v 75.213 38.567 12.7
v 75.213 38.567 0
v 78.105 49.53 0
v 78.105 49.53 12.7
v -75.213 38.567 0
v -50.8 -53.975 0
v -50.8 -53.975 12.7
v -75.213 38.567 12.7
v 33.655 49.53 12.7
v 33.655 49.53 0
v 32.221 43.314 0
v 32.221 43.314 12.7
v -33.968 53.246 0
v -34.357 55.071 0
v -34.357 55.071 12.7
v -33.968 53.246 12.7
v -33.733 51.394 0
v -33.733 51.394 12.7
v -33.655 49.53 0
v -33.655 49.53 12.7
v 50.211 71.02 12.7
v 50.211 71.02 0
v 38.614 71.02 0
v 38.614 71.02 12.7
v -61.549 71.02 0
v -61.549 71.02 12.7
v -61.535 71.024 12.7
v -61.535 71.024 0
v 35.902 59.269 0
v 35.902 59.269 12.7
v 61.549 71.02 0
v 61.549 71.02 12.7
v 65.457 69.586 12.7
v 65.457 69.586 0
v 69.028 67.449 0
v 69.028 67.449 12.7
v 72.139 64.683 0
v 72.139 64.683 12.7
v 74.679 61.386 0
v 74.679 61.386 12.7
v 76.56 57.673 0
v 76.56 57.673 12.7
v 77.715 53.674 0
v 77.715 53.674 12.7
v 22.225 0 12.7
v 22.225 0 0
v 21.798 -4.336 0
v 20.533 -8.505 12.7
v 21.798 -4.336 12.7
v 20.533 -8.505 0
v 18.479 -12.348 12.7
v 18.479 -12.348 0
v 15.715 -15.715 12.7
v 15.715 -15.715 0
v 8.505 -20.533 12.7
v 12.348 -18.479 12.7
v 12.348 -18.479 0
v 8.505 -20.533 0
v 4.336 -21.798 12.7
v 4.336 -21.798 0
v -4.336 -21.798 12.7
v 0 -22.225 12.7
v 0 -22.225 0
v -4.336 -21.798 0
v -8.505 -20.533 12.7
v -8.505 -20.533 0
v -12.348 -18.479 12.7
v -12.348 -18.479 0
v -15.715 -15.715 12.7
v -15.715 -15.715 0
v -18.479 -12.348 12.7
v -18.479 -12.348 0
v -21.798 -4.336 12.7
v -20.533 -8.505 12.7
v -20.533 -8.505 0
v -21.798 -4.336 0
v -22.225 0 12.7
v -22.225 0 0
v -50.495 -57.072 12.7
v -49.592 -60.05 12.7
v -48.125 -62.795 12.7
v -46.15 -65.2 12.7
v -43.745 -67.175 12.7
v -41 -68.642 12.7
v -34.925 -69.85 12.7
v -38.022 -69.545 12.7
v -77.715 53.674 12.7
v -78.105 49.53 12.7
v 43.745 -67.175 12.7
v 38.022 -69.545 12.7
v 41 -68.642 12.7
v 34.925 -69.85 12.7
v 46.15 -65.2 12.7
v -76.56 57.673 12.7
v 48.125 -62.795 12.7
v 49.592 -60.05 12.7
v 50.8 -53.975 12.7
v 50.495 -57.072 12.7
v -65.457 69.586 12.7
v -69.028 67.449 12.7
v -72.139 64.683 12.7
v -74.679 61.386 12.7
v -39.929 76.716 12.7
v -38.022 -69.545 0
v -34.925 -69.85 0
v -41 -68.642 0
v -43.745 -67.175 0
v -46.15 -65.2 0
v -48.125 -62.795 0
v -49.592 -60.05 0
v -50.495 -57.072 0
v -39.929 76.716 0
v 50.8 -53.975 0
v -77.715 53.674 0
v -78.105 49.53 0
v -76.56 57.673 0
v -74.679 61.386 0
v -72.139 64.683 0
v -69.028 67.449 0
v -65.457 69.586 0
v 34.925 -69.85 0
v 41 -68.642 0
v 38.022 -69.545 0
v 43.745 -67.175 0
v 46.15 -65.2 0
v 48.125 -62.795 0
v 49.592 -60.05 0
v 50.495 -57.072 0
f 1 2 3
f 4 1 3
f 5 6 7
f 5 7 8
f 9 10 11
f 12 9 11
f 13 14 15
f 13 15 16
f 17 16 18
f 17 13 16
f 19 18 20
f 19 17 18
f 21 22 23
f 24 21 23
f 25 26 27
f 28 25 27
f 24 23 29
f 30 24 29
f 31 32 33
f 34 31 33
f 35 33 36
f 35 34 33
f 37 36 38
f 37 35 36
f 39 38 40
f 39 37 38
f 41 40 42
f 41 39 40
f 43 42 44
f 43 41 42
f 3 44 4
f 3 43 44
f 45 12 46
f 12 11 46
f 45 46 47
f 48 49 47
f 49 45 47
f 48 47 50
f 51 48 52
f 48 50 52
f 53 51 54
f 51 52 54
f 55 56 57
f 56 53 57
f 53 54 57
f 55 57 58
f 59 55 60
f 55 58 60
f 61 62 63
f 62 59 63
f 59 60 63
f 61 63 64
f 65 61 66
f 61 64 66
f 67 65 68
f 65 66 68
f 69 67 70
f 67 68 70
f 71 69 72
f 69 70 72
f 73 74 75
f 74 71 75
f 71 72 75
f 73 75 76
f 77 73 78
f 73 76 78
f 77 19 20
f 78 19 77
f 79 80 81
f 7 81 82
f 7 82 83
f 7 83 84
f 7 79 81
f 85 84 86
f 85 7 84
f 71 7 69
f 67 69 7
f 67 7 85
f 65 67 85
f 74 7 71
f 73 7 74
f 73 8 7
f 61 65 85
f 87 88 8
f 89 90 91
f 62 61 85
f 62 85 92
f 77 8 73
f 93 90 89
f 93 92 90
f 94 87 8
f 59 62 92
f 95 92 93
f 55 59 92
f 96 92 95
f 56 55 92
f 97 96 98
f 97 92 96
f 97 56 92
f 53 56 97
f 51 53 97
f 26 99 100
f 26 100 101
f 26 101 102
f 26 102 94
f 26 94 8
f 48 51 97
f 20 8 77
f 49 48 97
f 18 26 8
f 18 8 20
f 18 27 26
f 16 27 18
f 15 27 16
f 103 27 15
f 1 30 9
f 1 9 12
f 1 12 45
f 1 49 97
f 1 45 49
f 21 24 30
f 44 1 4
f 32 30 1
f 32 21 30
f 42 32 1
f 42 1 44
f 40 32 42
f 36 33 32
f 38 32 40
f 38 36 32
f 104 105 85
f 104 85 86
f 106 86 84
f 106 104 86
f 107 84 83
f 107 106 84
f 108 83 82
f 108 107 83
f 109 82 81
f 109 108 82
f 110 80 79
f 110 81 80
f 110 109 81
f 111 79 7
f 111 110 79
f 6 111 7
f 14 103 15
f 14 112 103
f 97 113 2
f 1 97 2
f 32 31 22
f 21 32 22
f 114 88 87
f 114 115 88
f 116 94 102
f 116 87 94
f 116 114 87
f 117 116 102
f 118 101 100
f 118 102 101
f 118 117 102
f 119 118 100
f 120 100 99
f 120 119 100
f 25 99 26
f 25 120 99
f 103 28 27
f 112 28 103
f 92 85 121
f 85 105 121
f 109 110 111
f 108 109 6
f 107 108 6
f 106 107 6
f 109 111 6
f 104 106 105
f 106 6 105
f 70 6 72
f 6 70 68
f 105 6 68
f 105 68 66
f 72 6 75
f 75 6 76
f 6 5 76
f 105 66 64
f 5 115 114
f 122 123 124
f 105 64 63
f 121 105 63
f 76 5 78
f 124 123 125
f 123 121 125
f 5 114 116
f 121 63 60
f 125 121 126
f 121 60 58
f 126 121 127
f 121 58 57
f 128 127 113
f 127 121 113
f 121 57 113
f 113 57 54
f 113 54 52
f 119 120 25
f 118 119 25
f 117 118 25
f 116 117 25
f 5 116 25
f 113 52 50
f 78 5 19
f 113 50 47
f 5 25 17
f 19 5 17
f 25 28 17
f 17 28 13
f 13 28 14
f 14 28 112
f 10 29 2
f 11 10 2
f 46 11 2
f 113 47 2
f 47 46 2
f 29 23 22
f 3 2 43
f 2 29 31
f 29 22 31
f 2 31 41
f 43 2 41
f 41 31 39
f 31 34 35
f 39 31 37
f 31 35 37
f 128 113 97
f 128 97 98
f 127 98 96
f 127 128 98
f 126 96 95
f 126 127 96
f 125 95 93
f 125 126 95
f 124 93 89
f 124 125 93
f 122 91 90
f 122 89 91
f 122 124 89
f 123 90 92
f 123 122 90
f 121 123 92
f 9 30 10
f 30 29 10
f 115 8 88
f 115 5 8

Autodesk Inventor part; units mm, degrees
ref_plane "YZ Plane" through (0, 0, 0) normal (1, 0, 0) x (0, 1, 0)
ref_plane "XZ Plane" through (0, 0, 0) normal (0, 1, 0) x (-1, 0, 0)
ref_plane "XY Plane" through (0, 0, 0) normal (0, 0, 1) x (1, 0, 0)
sketch "Sketch1" plane through (0, 0, 0) normal (0, 0, 1) x (1, 0, 0)
  arc A0 (-22.225, 0) -> (22.225, 0) centre (0, 0) ccw
  arc A1 (34.925, -69.85) -> (50.8, -53.975) centre (34.925, -53.975) ccw
  arc A2 (-50.8, -53.975) -> (-34.925, -69.85) centre (-34.925, -53.975) ccw
  line L0 (-34.925, -69.85) -> (34.925, -69.85)
  line L1 (-50.8, -53.975) -> (-78.105, 49.53)
  line L2 (50.8, -53.975) -> (78.105, 49.53)
  line L3 (-33.655, 49.53) -> (-22.225, 0)
  line L4 (33.655, 49.53) -> (22.225, 0)
  line L5 (-61.5491, 71.0198) -> (-39.9288, 76.7156)
  line L6 (-39.9288, 76.7156) -> (-34.3567, 55.0708)
  line L7 (61.5491, 71.0198) -> (38.6142, 71.0198)
  line L8 (38.6142, 71.0198) -> (32.2206, 43.3143)
  arc A3 (-33.655, 49.53) -> (-34.3567, 55.0708) centre (-55.88, 49.53) ccw
  arc A4 (-61.5347, 71.0236) -> (-75.2129, 38.5669) centre (-55.88, 49.53) ccw
  arc A5 (75.2129, 38.5669) -> (50.2109, 71.0198) centre (55.88, 49.53) ccw
  arc A6 (35.9025, 59.269) -> (33.655, 49.53) centre (55.88, 49.53) ccw
  dimension "d1" = 31.75
  dimension "d5" = 31.75
  dimension "d8" = 34.925
  dimension "d11" = 69.85
  dimension "d15" = 119.38
  dimension "d16" = 55.88
extrude "Extrusion1" add sketch "Sketch1" along normal blind 12.7 contours A0 L4 L8 L7 A5 L2 A1 L0 A2 L1 A4 L5 L6 A3 L3
properties part number "4-2"
